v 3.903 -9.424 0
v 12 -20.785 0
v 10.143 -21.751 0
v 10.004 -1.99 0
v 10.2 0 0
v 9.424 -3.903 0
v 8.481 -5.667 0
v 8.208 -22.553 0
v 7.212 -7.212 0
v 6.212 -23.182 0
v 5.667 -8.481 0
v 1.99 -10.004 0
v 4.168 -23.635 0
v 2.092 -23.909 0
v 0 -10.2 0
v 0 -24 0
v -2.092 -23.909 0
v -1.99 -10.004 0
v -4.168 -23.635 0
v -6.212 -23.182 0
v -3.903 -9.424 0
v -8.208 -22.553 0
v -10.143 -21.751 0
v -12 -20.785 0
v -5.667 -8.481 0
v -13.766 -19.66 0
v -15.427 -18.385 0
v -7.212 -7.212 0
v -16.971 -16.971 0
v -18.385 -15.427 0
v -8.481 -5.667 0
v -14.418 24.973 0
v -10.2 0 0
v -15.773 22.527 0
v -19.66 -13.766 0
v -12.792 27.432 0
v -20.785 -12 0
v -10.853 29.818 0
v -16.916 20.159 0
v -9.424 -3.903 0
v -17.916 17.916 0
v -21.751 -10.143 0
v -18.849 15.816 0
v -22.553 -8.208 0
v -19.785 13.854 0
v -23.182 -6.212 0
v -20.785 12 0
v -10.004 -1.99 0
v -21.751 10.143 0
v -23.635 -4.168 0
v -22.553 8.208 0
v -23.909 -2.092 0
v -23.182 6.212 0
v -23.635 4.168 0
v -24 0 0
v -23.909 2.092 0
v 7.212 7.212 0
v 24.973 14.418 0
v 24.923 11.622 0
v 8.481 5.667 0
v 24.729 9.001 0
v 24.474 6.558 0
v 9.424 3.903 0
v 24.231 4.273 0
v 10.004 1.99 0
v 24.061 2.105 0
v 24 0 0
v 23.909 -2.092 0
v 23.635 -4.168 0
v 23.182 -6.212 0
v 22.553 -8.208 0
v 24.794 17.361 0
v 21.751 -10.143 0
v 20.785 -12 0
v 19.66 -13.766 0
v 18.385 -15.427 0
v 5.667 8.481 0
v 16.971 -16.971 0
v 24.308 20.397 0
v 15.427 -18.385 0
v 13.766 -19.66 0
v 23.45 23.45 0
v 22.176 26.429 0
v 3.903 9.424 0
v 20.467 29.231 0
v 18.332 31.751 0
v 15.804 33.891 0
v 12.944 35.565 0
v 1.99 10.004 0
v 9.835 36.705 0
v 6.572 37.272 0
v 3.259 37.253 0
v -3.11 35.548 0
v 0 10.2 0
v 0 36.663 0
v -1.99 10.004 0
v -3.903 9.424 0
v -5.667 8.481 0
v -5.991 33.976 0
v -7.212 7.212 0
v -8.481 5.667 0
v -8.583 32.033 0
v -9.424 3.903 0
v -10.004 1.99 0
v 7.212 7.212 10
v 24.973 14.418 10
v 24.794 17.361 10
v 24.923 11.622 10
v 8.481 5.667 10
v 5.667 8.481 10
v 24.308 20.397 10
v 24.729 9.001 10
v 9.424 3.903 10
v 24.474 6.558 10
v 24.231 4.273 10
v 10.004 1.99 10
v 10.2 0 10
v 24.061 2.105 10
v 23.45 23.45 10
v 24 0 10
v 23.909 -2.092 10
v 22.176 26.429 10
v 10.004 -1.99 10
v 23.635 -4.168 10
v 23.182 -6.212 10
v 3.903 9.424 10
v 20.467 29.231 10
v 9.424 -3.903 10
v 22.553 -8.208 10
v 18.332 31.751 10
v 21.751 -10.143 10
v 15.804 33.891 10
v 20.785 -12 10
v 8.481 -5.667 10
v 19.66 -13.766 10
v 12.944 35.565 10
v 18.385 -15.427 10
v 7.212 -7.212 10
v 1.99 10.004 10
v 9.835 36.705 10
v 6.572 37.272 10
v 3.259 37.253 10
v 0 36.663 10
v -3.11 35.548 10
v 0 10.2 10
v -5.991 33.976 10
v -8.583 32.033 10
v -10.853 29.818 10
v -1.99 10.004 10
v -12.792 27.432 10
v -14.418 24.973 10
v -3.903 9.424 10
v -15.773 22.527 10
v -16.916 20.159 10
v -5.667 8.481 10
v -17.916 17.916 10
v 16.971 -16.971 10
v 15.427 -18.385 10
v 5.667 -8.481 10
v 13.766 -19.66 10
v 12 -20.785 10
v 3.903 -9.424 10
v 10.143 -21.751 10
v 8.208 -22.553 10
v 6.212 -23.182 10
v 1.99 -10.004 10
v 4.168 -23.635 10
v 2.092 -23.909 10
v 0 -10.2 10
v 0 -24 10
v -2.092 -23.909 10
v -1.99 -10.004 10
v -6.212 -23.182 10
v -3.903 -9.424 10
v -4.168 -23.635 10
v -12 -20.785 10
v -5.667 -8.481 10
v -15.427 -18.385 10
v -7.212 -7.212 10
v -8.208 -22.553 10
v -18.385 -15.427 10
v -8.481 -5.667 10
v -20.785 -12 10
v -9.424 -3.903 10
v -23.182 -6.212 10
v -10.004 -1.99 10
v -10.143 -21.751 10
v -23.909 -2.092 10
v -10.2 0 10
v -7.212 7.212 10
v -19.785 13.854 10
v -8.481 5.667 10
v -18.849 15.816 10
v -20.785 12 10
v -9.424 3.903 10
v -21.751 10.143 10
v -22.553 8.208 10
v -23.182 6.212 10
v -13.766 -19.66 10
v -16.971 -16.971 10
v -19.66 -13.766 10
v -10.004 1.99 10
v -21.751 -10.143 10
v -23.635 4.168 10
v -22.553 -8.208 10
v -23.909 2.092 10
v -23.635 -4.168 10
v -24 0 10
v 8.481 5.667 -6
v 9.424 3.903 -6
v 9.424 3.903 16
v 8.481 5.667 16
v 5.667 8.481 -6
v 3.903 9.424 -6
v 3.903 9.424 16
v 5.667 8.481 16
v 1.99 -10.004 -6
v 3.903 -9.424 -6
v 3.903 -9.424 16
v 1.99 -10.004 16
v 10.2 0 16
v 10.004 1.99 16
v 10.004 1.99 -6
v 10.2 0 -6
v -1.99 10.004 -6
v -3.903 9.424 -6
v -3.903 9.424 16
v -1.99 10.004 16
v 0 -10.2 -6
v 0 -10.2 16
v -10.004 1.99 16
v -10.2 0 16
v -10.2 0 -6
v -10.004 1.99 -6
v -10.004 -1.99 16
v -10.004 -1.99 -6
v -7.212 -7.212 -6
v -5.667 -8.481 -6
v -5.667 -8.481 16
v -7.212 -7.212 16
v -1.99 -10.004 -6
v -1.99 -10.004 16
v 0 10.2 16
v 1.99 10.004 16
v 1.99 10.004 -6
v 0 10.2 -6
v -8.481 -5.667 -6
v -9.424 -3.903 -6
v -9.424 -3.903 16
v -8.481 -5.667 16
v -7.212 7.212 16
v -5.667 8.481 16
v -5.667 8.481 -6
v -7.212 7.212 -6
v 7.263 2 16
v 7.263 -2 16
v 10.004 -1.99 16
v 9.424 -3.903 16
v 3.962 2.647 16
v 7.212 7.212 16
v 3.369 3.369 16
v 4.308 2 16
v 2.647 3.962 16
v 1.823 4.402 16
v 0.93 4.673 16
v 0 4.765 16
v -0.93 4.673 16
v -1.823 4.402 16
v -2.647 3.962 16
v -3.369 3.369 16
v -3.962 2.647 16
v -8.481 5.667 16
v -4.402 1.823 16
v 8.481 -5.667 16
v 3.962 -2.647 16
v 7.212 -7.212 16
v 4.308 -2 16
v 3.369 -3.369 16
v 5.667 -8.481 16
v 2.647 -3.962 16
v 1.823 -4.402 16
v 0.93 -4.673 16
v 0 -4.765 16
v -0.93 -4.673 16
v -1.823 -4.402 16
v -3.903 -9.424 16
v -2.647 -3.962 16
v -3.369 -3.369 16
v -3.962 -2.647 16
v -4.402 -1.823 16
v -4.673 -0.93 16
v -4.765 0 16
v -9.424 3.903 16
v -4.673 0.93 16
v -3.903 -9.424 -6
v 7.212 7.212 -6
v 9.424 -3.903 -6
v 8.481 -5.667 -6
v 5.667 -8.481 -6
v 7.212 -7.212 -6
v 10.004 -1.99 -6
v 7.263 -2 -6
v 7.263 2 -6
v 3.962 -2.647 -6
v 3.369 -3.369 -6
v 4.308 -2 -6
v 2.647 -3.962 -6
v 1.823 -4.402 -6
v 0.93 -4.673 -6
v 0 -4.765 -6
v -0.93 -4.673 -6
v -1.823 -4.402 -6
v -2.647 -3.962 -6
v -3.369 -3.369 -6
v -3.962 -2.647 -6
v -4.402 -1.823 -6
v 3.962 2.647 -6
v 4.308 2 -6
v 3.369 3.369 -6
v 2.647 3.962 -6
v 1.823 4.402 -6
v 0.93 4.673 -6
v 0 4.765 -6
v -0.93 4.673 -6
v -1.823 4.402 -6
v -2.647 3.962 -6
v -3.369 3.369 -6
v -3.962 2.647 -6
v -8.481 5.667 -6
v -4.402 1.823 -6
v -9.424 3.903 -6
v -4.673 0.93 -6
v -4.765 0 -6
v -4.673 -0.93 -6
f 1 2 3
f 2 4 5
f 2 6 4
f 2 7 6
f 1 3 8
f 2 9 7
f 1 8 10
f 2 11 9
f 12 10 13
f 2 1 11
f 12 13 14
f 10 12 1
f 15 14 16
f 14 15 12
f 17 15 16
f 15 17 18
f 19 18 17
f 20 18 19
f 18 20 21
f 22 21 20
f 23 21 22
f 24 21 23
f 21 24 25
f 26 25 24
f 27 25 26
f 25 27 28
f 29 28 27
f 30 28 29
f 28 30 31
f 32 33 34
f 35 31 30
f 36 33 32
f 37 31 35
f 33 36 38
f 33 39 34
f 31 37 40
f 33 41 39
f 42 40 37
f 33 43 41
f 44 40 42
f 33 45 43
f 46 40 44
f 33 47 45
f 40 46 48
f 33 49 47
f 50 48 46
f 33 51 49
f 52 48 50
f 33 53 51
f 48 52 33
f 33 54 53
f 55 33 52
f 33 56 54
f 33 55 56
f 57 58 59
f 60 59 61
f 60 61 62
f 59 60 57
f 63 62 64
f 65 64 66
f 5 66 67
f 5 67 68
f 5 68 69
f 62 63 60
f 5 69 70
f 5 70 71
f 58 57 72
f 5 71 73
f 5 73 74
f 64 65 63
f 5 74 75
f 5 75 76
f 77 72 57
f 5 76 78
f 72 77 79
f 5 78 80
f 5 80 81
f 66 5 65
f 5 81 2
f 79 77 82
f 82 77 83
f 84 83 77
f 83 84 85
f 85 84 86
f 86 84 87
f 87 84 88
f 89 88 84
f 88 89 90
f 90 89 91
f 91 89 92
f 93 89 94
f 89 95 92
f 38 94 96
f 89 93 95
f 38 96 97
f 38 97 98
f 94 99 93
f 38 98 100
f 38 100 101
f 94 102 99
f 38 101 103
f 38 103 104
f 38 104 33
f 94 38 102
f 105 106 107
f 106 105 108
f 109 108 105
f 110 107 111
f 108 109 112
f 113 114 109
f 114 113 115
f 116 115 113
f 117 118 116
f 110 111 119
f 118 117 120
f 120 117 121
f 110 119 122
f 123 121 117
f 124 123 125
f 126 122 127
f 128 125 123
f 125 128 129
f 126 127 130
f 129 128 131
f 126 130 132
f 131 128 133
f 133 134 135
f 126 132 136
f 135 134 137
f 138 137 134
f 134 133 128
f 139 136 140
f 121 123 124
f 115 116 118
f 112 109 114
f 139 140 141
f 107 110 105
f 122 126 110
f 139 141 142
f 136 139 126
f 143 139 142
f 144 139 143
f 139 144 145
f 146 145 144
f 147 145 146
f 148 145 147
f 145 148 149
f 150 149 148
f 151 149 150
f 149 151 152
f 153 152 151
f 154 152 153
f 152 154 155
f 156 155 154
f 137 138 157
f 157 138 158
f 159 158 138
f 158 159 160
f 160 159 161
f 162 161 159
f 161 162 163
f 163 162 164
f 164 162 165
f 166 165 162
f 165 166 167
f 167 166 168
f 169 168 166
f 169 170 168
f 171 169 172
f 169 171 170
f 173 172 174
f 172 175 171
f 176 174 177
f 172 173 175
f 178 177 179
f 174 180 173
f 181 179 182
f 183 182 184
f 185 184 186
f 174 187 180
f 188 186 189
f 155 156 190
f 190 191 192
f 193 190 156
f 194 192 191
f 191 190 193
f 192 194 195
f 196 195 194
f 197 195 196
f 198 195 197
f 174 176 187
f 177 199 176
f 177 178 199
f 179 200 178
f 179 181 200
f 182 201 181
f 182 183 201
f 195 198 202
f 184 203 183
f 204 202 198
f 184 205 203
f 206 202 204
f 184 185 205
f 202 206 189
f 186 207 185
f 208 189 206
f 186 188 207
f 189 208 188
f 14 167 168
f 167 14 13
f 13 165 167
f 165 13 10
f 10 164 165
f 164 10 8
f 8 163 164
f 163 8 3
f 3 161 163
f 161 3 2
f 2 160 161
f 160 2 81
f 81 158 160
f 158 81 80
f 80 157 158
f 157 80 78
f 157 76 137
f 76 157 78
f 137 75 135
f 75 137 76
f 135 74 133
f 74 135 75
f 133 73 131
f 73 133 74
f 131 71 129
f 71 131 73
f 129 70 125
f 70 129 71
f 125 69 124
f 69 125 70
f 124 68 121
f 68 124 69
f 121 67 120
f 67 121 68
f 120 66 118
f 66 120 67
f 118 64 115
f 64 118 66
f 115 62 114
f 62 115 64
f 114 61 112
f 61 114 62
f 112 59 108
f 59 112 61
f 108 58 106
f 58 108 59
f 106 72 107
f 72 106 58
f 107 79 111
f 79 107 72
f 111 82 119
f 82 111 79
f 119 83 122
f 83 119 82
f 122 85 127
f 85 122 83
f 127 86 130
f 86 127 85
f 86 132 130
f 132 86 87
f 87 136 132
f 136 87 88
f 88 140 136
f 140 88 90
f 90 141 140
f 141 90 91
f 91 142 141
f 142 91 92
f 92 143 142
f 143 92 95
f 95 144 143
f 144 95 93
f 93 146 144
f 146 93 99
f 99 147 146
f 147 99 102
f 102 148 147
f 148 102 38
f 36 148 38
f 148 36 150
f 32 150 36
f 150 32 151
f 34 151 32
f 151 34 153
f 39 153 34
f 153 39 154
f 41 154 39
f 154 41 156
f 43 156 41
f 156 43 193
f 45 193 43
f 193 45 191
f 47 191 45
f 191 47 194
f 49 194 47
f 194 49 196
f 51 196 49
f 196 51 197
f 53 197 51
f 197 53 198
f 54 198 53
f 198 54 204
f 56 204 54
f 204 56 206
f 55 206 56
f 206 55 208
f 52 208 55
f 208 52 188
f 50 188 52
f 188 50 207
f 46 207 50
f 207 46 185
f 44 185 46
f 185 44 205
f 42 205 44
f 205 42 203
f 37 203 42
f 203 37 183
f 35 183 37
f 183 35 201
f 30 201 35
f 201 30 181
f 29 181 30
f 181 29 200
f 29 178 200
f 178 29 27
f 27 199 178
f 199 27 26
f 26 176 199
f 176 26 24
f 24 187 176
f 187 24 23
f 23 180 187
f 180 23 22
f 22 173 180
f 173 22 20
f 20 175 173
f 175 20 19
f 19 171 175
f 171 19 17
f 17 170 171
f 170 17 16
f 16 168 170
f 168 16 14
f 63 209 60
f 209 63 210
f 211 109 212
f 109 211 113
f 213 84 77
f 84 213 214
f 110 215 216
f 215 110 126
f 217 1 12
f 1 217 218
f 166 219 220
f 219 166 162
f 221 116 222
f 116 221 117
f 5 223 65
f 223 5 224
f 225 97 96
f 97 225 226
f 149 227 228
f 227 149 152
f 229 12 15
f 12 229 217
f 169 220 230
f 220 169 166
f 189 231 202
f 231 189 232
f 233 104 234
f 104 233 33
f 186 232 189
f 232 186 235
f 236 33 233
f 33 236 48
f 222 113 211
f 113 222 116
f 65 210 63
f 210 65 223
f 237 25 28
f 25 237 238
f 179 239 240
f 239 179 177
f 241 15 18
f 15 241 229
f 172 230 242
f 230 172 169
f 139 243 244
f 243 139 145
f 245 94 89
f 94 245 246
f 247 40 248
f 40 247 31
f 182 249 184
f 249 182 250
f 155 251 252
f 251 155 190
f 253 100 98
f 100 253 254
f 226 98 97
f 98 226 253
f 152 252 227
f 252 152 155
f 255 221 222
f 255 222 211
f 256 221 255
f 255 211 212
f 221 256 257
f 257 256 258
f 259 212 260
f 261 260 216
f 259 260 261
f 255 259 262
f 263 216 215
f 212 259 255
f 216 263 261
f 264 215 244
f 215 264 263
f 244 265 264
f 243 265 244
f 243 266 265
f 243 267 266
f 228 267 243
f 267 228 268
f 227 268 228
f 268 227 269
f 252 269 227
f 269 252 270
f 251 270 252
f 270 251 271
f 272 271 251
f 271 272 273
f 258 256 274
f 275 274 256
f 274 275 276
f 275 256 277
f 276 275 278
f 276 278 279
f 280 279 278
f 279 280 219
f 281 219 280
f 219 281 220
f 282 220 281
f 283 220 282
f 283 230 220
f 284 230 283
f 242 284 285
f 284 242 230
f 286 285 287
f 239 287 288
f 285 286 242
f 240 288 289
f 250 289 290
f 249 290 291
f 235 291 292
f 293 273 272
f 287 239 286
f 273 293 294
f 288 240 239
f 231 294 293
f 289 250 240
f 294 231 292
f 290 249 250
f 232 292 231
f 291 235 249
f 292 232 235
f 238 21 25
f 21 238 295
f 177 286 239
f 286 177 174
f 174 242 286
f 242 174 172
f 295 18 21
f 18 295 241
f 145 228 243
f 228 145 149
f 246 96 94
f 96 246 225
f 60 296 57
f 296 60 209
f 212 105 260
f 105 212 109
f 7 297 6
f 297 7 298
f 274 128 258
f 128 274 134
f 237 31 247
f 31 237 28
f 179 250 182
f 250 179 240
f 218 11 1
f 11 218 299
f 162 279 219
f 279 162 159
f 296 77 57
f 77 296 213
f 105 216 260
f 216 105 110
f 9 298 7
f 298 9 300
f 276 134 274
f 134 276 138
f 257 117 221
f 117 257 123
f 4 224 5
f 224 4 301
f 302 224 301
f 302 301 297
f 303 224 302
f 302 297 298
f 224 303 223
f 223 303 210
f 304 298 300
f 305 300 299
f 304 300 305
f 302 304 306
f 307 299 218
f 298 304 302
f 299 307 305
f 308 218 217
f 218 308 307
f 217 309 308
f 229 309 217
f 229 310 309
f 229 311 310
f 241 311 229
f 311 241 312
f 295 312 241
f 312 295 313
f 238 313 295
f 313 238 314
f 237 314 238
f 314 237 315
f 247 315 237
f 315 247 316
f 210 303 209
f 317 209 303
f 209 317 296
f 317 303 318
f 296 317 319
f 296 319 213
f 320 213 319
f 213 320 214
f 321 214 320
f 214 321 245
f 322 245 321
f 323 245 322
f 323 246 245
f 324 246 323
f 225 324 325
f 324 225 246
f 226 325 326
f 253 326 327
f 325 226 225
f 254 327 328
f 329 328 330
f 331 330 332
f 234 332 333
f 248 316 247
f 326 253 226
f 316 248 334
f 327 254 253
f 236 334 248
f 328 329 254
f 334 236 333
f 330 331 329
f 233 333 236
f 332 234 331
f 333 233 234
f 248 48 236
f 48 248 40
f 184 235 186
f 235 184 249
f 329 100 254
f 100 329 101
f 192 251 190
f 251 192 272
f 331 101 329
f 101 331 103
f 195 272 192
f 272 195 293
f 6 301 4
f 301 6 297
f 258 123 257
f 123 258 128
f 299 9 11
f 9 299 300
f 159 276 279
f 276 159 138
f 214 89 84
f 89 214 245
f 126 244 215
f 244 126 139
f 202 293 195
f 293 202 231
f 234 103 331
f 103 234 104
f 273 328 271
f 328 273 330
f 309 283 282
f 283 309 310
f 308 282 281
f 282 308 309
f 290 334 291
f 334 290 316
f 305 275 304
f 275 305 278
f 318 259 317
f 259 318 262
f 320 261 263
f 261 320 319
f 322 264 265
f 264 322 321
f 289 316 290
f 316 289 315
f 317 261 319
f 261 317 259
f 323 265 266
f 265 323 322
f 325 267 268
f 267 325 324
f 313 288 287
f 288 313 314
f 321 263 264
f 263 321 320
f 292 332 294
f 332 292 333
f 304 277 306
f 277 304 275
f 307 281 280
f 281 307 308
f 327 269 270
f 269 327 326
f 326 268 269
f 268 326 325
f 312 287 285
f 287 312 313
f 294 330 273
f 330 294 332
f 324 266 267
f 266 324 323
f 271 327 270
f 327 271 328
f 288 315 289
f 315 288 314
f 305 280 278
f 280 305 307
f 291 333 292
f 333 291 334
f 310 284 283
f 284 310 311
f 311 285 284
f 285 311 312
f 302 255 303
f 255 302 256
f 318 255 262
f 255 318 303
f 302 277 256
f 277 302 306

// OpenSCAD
$fn = 32;

// ----------------------------------------------------------------------
// Cam: base radius 24 mm with a 14 mm lift over 150 degrees
// ----------------------------------------------------------------------

// --- parameters (mm) ---
base_r = 24;              // base radius
lift = 14;                // lift height above the base radius
lift_span = 150;          // angular width of the lift
lift_start = 0;           // angle where the lift starts
cam_t = 10;               // cam plate thickness
hub_d = 20.4;             // hub diameter
hub_h = 22;               // hub height
bore_d = 9.53;            // bore
key_w = 4;                // keyway width
key_depth = 2;            // keyway depth

cam_profile = [[24, 0], [24.061, 2.105], [24.231, 4.273], [24.474, 6.558], [24.729, 9.001], [24.923, 11.622], [24.973, 14.418], [24.794, 17.361], [24.308, 20.397], [23.45, 23.45], [22.176, 26.429], [20.467, 29.231], [18.332, 31.751], [15.804, 33.891], [12.944, 35.565], [9.835, 36.705], [6.572, 37.272], [3.259, 37.253], [0, 36.663], [-3.11, 35.548], [-5.991, 33.976], [-8.583, 32.033], [-10.853, 29.818], [-12.792, 27.432], [-14.418, 24.973], [-15.773, 22.527], [-16.916, 20.159], [-17.916, 17.916], [-18.849, 15.816], [-19.785, 13.854], [-20.785, 12], [-21.751, 10.143], [-22.553, 8.208], [-23.182, 6.212], [-23.635, 4.168], [-23.909, 2.092], [-24, 0], [-23.909, -2.092], [-23.635, -4.168], [-23.182, -6.212], [-22.553, -8.208], [-21.751, -10.143], [-20.785, -12], [-19.66, -13.766], [-18.385, -15.427], [-16.971, -16.971], [-15.427, -18.385], [-13.766, -19.66], [-12, -20.785], [-10.143, -21.751], [-8.208, -22.553], [-6.212, -23.182], [-4.168, -23.635], [-2.092, -23.909], [0, -24], [2.092, -23.909], [4.168, -23.635], [6.212, -23.182], [8.208, -22.553], [10.143, -21.751], [12, -20.785], [13.766, -19.66], [15.427, -18.385], [16.971, -16.971], [18.385, -15.427], [19.66, -13.766], [20.785, -12], [21.751, -10.143], [22.553, -8.208], [23.182, -6.212], [23.635, -4.168], [23.909, -2.092]];

difference() {
  union() {
    linear_extrude(height = cam_t) polygon(cam_profile);
    /* hub, proud of the cam plate on both sides */
    translate([0, 0, -6]) cylinder(h = hub_h, d = hub_d);
  }
  /* bore through the hub, 2.5 mm clear on both faces */
  translate([0, 0, -8.5]) cylinder(h = hub_h + 5, d = bore_d);
  /* keyway, milled through the whole hub */
  translate([2.763, -2, -8.5]) cube([4.5, 4, 27]);
}
